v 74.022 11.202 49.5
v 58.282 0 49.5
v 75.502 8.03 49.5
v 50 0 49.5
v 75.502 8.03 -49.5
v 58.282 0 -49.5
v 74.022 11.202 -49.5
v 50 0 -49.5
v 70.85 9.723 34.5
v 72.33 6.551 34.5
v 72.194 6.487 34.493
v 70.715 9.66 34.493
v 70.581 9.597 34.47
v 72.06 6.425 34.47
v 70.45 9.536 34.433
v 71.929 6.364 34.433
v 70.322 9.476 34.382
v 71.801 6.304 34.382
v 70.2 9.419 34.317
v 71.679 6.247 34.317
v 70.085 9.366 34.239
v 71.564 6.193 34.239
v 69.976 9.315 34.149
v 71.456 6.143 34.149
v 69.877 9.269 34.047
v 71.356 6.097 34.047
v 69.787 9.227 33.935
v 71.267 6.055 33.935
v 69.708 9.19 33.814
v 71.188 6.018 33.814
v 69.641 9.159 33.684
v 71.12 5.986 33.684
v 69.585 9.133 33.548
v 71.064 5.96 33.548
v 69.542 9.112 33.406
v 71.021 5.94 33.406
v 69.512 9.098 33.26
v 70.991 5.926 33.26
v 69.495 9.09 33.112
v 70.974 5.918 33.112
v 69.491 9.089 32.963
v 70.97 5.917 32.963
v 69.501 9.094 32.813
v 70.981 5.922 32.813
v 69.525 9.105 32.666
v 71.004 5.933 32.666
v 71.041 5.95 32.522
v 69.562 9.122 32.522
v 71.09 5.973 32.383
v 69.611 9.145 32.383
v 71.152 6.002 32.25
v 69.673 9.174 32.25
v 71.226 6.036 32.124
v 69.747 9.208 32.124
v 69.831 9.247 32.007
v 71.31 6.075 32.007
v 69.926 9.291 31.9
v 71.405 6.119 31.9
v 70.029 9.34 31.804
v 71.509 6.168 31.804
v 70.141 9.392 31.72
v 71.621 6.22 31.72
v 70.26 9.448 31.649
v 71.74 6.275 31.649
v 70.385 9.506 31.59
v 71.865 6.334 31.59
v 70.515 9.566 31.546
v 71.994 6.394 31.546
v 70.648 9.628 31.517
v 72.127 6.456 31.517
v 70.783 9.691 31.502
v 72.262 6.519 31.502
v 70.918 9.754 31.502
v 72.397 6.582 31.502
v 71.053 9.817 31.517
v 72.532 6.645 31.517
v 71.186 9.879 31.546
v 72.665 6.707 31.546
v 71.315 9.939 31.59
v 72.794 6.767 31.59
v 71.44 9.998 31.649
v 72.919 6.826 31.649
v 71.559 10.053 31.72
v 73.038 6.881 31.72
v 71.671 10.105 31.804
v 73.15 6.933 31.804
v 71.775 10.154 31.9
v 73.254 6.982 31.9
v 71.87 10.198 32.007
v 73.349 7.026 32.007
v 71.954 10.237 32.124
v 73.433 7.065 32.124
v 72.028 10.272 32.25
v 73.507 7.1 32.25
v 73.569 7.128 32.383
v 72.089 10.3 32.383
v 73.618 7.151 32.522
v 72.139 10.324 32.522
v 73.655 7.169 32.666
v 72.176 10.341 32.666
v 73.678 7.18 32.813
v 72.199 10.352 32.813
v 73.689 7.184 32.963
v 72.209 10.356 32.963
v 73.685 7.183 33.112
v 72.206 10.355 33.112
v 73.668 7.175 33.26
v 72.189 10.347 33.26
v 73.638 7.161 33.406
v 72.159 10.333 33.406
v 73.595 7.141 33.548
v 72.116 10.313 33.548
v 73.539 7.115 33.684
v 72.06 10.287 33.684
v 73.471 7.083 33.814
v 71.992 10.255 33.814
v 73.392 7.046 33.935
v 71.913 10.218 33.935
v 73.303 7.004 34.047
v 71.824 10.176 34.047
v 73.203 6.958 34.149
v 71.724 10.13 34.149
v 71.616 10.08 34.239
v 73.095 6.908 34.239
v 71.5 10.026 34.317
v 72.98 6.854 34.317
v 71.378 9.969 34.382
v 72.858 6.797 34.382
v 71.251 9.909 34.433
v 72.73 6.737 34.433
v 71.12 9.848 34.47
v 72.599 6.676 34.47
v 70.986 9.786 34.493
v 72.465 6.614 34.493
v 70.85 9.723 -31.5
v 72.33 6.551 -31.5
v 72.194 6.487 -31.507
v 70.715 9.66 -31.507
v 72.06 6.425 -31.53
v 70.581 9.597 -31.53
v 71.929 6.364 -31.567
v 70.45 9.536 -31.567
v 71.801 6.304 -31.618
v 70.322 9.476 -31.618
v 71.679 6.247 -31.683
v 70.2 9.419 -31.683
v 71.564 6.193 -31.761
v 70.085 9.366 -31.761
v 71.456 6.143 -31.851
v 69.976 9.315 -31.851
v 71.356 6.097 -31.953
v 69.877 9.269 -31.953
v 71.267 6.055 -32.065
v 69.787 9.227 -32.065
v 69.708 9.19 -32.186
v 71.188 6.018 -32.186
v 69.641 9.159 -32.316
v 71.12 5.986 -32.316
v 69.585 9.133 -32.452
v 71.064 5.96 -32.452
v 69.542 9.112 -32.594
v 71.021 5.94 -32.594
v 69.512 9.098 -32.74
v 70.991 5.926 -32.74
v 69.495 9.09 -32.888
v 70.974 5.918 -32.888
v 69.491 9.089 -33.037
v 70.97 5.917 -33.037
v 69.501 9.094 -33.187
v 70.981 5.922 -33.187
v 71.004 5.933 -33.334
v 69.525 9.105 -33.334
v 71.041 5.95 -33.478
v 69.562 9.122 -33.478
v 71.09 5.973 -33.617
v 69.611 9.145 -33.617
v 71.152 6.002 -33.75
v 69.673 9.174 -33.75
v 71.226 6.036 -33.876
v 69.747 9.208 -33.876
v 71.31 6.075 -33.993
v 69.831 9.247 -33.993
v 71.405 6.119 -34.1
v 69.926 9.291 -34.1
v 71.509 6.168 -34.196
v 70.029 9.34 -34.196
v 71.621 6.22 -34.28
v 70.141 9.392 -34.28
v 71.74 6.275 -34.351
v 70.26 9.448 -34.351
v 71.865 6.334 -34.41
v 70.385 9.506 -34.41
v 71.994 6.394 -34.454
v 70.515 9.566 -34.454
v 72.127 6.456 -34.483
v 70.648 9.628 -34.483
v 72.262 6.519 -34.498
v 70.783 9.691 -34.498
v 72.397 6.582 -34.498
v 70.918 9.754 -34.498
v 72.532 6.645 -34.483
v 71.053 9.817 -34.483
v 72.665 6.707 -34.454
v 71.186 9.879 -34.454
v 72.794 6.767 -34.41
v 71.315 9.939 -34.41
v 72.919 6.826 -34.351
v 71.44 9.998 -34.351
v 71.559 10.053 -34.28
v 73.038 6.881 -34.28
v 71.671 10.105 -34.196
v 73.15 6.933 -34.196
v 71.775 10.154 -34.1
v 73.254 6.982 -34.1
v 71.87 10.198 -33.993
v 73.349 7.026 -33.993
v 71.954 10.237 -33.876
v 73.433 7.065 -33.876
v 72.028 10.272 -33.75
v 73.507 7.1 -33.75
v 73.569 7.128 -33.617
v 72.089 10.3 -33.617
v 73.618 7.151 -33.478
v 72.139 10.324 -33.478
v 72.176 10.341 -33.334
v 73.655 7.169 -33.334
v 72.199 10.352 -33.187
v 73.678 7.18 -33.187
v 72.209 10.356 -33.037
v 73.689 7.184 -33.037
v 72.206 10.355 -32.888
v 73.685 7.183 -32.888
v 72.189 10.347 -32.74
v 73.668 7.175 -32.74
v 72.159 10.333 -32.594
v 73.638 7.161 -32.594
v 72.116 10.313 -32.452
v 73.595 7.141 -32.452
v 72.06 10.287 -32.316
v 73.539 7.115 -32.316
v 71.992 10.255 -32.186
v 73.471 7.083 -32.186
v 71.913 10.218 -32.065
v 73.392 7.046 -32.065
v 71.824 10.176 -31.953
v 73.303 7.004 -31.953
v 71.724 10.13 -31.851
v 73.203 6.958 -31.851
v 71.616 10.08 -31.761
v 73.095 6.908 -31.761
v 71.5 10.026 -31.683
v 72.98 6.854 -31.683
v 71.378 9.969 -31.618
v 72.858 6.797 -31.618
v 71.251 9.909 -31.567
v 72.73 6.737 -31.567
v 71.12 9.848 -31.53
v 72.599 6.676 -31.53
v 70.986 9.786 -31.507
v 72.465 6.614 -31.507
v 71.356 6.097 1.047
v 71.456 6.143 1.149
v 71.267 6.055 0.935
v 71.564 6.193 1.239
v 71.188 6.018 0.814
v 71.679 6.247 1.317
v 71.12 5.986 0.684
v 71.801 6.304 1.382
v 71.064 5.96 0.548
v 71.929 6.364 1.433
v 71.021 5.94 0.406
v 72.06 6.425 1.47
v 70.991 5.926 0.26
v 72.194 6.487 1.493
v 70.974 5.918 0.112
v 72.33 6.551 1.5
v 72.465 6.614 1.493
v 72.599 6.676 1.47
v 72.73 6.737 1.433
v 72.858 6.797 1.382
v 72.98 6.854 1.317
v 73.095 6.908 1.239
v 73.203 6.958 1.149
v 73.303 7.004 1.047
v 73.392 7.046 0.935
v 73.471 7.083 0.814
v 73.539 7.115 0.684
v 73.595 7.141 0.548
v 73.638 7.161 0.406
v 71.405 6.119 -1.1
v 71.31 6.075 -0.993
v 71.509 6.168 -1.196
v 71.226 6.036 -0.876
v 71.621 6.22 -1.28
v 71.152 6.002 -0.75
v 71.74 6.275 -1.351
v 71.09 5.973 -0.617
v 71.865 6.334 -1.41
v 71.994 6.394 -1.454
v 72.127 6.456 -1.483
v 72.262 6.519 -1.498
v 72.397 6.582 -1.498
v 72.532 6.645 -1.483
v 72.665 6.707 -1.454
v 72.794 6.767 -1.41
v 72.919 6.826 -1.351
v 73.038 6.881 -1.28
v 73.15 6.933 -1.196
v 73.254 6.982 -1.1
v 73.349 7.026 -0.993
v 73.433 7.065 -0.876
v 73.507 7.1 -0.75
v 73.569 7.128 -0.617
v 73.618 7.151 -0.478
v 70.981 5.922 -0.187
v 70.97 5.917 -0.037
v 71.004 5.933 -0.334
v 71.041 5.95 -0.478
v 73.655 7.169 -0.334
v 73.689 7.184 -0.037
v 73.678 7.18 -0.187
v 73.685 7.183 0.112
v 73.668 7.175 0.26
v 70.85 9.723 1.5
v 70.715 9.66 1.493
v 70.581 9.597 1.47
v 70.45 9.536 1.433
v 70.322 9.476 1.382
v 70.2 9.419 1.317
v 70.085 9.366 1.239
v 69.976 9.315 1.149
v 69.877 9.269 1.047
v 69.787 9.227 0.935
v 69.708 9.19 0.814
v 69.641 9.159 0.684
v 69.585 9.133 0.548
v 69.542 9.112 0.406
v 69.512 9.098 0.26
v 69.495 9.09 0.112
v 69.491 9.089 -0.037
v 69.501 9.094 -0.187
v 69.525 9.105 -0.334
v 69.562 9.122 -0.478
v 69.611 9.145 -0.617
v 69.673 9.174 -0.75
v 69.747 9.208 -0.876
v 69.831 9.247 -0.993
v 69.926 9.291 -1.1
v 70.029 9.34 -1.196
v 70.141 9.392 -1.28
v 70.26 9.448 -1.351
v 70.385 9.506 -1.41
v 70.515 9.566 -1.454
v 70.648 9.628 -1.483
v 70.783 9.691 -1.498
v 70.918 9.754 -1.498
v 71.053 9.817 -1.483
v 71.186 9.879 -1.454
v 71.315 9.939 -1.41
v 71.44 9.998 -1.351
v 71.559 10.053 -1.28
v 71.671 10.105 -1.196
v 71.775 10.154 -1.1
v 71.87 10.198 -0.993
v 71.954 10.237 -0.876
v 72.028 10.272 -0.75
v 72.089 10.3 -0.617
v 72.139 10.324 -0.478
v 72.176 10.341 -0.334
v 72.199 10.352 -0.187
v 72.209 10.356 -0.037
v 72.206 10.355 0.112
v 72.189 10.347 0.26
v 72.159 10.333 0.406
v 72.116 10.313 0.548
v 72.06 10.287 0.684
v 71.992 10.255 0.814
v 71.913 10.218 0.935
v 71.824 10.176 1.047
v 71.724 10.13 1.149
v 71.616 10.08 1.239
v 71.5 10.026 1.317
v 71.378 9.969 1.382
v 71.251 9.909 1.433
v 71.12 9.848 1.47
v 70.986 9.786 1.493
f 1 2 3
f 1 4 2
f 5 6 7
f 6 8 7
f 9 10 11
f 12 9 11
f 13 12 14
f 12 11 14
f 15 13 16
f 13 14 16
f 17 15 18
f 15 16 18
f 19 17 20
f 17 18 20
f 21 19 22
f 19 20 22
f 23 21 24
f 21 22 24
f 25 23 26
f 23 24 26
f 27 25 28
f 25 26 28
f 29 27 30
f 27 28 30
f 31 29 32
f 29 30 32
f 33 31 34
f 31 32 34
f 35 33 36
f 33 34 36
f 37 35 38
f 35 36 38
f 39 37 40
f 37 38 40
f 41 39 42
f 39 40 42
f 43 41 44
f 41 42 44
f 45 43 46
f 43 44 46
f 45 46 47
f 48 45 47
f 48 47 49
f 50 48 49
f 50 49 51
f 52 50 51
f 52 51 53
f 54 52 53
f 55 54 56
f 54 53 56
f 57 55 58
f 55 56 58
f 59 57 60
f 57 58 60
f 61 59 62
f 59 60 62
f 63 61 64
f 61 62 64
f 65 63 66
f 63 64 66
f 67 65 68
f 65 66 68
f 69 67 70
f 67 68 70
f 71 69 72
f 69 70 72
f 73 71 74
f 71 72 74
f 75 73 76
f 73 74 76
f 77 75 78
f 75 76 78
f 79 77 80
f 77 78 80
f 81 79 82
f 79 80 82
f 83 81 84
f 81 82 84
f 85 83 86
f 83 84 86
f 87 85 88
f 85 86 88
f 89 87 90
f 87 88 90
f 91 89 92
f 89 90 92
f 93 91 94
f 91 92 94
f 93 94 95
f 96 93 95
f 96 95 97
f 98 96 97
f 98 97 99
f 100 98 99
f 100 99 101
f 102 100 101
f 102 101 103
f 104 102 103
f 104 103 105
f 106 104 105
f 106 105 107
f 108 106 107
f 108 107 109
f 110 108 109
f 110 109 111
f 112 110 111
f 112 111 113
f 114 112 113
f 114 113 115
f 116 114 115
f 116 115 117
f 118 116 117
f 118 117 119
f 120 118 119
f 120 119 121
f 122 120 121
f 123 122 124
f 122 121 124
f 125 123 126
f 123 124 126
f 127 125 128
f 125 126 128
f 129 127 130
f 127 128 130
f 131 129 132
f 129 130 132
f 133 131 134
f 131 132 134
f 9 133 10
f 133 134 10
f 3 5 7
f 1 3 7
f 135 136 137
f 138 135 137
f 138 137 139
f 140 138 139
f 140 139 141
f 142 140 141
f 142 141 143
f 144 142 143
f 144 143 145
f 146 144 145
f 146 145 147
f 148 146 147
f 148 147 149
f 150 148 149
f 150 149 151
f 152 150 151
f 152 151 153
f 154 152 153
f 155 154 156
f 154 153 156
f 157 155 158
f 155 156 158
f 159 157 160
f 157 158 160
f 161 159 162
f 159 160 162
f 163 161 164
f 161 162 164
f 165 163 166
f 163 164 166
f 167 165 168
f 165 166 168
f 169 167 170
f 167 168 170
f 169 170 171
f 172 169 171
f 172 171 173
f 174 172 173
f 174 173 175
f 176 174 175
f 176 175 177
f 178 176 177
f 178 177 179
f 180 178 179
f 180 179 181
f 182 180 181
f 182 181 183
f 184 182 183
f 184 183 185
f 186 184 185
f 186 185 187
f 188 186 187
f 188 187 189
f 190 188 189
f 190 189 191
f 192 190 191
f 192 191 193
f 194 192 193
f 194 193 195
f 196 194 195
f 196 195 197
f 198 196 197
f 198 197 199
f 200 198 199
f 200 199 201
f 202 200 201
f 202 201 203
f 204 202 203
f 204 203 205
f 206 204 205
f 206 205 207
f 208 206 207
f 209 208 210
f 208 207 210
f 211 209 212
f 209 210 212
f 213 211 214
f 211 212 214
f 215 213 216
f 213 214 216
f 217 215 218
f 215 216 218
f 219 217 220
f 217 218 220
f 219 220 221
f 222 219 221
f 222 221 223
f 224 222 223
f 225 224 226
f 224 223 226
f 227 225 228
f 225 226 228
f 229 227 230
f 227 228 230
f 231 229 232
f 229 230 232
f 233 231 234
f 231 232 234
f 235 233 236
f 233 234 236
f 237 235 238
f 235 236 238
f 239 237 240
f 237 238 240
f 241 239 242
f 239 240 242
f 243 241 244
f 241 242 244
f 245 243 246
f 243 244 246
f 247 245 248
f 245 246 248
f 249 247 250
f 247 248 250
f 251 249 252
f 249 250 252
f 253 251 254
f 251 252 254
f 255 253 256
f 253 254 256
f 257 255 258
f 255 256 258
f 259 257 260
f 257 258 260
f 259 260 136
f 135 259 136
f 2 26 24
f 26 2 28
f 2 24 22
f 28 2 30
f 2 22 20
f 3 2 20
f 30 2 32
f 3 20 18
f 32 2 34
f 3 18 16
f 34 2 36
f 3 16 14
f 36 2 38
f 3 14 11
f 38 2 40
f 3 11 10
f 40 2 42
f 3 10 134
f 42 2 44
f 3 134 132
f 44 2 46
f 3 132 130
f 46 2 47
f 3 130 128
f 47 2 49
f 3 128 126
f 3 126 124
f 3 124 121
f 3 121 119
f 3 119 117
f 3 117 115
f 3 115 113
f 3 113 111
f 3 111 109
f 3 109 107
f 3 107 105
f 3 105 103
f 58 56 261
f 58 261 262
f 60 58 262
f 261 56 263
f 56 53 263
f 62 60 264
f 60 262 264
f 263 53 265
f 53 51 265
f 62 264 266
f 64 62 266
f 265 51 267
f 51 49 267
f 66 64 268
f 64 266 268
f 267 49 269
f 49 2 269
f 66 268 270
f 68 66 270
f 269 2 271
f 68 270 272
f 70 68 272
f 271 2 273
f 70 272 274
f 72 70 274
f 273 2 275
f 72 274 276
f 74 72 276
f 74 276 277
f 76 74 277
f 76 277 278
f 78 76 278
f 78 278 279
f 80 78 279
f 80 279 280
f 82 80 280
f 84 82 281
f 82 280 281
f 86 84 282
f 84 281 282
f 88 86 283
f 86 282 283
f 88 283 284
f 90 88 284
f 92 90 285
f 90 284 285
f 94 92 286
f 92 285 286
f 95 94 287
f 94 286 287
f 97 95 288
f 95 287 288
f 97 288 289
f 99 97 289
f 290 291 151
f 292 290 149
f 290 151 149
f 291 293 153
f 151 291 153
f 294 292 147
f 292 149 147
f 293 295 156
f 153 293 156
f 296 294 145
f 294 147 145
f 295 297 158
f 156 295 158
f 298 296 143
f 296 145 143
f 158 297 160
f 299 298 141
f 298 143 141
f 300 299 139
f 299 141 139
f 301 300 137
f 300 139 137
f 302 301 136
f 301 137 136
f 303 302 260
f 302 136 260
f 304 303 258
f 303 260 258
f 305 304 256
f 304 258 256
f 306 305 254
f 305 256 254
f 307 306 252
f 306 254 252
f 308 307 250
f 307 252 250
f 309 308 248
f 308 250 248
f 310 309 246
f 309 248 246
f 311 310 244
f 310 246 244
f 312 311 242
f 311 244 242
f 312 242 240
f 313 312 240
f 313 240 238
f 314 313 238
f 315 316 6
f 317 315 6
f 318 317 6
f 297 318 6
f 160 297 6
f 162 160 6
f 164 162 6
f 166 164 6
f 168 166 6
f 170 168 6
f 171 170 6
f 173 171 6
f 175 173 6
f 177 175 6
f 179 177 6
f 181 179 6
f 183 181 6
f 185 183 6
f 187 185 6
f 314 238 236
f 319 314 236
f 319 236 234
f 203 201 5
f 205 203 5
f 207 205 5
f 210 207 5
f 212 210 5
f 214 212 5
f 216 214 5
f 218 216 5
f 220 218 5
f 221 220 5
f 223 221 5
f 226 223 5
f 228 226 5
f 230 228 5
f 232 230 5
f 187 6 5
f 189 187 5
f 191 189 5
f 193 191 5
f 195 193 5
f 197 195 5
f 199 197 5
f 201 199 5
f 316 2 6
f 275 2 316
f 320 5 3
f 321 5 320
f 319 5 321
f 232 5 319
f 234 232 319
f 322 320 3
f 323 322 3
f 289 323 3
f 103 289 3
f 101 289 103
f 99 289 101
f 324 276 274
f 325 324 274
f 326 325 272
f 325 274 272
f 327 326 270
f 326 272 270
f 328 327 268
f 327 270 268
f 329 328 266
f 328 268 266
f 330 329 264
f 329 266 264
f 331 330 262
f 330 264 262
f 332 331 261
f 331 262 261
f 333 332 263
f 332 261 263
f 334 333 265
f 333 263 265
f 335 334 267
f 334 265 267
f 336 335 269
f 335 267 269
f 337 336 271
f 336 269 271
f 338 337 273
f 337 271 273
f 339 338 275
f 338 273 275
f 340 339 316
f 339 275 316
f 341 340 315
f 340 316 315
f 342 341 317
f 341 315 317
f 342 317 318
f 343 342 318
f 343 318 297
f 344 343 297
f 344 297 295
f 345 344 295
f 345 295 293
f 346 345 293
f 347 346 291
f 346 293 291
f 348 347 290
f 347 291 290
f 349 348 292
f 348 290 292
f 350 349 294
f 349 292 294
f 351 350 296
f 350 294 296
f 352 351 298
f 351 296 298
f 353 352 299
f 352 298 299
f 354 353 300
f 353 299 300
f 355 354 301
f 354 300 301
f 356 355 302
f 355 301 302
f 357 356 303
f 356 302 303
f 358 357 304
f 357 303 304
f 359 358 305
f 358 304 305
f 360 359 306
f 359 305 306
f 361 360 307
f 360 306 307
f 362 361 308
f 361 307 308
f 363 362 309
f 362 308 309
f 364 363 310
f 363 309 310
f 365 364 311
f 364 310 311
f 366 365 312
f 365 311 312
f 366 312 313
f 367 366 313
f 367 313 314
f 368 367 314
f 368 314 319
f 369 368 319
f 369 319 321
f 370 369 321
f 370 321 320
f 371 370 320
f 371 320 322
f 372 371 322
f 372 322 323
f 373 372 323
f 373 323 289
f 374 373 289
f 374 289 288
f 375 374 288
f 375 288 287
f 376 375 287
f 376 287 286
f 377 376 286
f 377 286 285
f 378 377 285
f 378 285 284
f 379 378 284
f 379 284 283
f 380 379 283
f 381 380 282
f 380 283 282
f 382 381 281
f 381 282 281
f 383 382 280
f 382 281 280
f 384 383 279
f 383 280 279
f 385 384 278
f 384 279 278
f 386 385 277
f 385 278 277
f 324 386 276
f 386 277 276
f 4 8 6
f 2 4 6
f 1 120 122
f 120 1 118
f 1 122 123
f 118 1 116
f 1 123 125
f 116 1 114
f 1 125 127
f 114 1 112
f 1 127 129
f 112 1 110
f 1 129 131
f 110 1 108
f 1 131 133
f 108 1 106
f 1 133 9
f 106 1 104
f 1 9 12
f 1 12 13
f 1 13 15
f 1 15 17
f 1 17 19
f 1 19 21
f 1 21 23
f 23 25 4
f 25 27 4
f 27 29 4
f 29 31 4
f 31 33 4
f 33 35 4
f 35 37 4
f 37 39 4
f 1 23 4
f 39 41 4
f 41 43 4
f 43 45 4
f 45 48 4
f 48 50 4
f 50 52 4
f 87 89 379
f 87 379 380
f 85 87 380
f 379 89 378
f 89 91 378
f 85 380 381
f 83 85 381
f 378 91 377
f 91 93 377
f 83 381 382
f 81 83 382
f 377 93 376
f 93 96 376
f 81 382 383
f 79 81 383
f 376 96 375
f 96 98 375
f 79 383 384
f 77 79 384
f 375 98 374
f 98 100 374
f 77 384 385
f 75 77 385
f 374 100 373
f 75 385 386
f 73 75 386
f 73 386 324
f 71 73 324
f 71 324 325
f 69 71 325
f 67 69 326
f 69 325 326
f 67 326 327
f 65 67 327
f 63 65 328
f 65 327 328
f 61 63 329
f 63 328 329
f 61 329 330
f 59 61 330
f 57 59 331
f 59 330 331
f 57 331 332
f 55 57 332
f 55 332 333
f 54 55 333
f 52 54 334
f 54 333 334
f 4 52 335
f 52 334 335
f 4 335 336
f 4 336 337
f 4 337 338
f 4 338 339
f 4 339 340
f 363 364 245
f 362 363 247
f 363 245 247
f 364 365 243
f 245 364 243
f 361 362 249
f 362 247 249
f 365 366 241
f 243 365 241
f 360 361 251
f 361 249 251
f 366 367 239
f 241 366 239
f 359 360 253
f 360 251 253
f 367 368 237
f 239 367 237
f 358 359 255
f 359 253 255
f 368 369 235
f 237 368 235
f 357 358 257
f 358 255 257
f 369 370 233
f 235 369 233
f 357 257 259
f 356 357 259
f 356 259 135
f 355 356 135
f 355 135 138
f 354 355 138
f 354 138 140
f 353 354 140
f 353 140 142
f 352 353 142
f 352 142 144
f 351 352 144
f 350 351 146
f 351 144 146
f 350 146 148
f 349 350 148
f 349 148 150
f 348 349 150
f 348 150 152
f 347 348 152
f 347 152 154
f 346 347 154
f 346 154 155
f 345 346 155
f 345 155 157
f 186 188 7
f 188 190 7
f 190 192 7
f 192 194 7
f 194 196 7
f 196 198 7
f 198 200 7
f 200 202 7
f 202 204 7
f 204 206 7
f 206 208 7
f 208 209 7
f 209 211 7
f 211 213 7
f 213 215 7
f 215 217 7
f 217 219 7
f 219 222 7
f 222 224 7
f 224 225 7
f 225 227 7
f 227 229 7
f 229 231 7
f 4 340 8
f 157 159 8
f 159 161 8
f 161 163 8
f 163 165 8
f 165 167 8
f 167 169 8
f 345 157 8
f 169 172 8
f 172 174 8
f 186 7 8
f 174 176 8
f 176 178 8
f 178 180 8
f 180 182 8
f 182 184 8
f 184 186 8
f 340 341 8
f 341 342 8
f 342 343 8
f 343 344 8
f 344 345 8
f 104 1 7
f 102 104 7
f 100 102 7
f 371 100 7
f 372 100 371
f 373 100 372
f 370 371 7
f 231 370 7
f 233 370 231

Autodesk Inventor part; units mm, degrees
ref_plane "YZ Plane" through (0, 0, 0) normal (1, 0, 0) x (0, 1, 0)
ref_plane "XZ Plane" through (0, 0, 0) normal (0, 1, 0) x (-1, 0, 0)
ref_plane "XY Plane" through (0, 0, 0) normal (0, 0, 1) x (1, 0, 0)
sketch "Náčrt1" plane through (0, 0, 0) normal (0, 0, 1) x (1, 0, 0)
  line L0 (0, 0) -> (11.831, 0)
  line L1 (11.831, 0) -> (26.7952, 6.9779)
  line L2 (26.7952, 6.9779) -> (24.6821, 11.5094)
  line L3 (24.6821, 11.5094) -> (0, 0)
  line L4 (0, 0) -> (26.7952, 0) construction
  line L5 (18.5187, 6.9803) -> (25.316, 10.15) construction
  line L6 (25.316, 10.15) -> (24.2277, 7.1599) construction
  line L7 (24.2277, 7.1599) -> (26.6578, 1.9486) construction
  line L8 (26.6578, 1.9486) -> (23.9388, 0.6808) construction
  line L9 (23.9388, 0.6808) -> (21.5088, 5.892) construction
  line L10 (21.5088, 5.892) -> (18.5187, 6.9803) construction
  line L11 (23.7275, 1.1339) -> (22.3681, 0.5) construction
  line L12 (26.4465, 2.4018) -> (27.8059, 3.0357) construction
  line L13 (22.3681, 0.5) -> (21.5228, 2.3126) construction
  line L14 (21.5228, 2.3126) -> (26.9607, 4.8483) construction
  line L15 (26.9607, 4.8483) -> (27.8059, 3.0357) construction
  line L16 (50, 0) -> (58.2817, 0)
  line L17 (58.2817, 0) -> (75.5016, 8.0297)
  line L18 (75.5016, 8.0297) -> (74.0224, 11.2018)
  line L19 (74.0224, 11.2018) -> (50, 0)
  line L20 (50, 0) -> (75.5016, 0) construction
  line L21 (69.7022, 8.6356) -> (72.1322, 3.4243) construction
  line L22 (72.1322, 3.4243) -> (71.0439, 0.4342) construction
  line L23 (71.0439, 0.4342) -> (77.8412, 3.6039) construction
  line L24 (77.8412, 3.6039) -> (74.8511, 4.6922) construction
  line L25 (74.8511, 4.6922) -> (72.4211, 9.9034) construction
  line L26 (72.4211, 9.9034) -> (69.7022, 8.6356) construction
  line L27 (21.9174, 8.5652) -> (21.2834, 9.9246) construction
  line L28 (71.0616, 9.2695) -> (70.8503, 9.7227) construction
  dimension "d8" = 5
  dimension "d9" = 25
  dimension "d11" = 8
  dimension "d12" = 3
  dimension "d13" = 45
  dimension "d14" = 7.5
  dimension "d16" = 0
  dimension "d17" = 6
  dimension "d18" = 0.5
  dimension "d19" = 0.5
  dimension "d20" = 2
  dimension "d21" = 27.2337
  dimension "d22" = 3.5
  dimension "d23" = 25
  dimension "d34" = 26.5058
  dimension "d35" = 50
  dimension "d36" = 45
  dimension "d37" = 3
  dimension "d38" = 7.5
  dimension "d39" = 8
  dimension "d42" = 2
  dimension "d44" = 2
  dimension "d59" = 5
  dimension "d63" = 0.5
  dimension "d64" = 19
  dimension "d65" = 0.4342
extrude "Vysunutí1" add sketch "Náčrt1" along normal mid plane 99 contours L19 L18 L17 L16
sketch "Náčrt3" plane through (50, 0, 49.5) normal (-0.4226, 0.9063, 0) x (0.9063, 0.4226, 0)
  line L0 (23.0058, 49.5) -> (23.0058, 82.5) construction
  line L1 (23.0058, 82.5) -> (23.0058, 115.5) construction
  line L2 (0, 99) -> (26.5058, 99) projected
  line L3 (23.0058, 49.5) -> (23.0058, 16.5) construction
  point P0 (-45.3154, 49.5)
  point P1 (23.0058, 99)
hole "Díra2" at (70.8503, 9.7227, 0) at (70.8503, 9.7227, -33) at (70.8503, 9.7227, 33) direction (0.4226, -0.9063, 0) diameter 3 end through all
thread "Závit1" size "M3x0.5" class "6H" standard "ANSI Metric M Profile" full length
thread "Závit2" size "M3x0.5" class "6H" standard "ANSI Metric M Profile" full length
thread "Závit3" size "M3x0.5" class "6H" standard "ANSI Metric M Profile" full length
properties part number "lowerRamp" material "Ocel, uhlík"
